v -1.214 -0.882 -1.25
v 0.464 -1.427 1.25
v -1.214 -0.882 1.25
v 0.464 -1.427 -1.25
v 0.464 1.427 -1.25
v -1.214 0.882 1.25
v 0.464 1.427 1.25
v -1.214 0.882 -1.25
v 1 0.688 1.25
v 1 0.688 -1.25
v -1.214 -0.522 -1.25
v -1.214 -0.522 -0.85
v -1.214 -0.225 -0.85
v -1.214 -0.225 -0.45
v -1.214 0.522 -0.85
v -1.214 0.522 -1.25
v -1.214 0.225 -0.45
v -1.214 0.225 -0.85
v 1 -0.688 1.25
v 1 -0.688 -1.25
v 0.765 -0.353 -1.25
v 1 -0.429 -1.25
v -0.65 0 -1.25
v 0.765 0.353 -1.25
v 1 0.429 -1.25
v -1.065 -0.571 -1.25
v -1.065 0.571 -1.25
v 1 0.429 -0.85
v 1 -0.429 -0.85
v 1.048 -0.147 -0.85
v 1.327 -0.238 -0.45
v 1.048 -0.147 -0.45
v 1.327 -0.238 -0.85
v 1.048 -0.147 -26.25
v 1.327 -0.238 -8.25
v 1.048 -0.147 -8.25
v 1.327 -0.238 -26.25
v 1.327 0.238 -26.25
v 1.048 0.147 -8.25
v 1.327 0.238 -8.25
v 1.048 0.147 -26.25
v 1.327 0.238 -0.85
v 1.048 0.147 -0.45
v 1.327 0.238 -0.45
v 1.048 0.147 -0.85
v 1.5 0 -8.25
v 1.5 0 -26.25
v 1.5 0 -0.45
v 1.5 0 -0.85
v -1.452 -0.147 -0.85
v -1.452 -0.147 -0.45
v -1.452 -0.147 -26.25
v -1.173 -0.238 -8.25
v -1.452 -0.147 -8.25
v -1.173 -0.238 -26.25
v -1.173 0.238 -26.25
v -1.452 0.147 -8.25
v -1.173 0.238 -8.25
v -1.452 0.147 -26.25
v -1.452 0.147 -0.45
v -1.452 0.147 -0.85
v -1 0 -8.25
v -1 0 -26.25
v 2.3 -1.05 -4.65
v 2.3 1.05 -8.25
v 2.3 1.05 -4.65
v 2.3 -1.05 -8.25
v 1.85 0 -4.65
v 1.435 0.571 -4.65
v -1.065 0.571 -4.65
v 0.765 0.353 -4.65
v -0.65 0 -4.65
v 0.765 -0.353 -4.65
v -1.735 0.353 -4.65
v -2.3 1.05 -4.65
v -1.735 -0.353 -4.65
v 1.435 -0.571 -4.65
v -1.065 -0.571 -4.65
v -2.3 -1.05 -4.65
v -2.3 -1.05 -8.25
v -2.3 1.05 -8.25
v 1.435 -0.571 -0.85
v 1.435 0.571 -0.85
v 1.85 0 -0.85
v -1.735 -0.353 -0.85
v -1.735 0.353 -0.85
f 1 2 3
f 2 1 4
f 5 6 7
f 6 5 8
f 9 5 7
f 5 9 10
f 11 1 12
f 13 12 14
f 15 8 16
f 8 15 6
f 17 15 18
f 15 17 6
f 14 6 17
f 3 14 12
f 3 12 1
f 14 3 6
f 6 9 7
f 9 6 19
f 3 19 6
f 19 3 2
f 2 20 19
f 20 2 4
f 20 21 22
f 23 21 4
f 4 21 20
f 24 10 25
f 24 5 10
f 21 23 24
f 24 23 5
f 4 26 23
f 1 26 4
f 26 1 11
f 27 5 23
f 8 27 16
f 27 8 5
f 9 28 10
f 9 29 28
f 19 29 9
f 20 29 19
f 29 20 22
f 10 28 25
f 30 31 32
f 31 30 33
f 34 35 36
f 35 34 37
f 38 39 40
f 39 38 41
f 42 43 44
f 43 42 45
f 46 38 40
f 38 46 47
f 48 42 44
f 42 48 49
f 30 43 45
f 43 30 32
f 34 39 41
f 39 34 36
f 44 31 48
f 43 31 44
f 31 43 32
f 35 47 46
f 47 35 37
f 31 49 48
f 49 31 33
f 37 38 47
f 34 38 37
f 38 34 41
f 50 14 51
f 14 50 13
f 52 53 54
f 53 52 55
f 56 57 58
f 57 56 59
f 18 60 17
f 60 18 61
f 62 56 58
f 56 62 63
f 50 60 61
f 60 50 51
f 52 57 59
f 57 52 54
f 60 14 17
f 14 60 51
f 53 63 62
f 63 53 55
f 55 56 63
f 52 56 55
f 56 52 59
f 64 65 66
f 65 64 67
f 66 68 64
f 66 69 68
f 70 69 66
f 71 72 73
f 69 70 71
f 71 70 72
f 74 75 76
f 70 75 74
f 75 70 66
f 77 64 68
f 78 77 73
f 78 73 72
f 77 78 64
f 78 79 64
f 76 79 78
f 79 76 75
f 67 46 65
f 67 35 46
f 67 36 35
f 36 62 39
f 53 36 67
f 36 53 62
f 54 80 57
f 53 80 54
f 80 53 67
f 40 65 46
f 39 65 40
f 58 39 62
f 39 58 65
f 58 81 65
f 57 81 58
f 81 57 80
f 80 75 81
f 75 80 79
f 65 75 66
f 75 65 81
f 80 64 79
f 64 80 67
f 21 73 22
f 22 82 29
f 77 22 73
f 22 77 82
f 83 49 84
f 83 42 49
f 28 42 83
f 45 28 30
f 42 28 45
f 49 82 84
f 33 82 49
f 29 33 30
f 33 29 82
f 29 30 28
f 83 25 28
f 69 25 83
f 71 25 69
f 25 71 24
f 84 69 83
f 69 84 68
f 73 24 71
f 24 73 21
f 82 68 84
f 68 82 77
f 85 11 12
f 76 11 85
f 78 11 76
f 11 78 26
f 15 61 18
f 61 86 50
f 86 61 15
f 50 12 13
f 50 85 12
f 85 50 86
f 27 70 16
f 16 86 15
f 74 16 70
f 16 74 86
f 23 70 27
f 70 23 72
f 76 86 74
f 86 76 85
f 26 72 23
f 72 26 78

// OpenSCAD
// Parameters
body_d = 3.0; //[1.5:6.0:0.1]
body_h = 2.5; //[1.25:5.0:0.1]
lead_d = 0.5; //[0.25:1.0:0.05]
lead_len = 25.0; //[12.5:50.0:0.5]
lead_pitch = 2.5; //[1.25:5.0:0.1]
lead_straight_from_body = 6.0; //[3.0:12.0:0.5]
bend_r = 1.0; //[0.5:2.0:0.1]
overlap = 0.8; //[0.5:2.0:0.1]
lead_exit_depth = 0.8; //[0.4:1.6:0.1]
sleeve_len = 4.0; //[2.0:10.0:0.5]
sleeve_od = 1.2; //[0.8:2.4:0.1]
mold_line_depth = 0.2; //[0.1:0.5:0.05]
mold_line_width = 0.8; //[0.4:1.6:0.1]
lead_spacing_ref_d = 0.8; //[0.4:2.0:0.1]
lead_spacing_ref_h = 1.5; //[0.8:4.0:0.1]

// Thermistor Body
module thermistor_body() {
  color([0.85, 0.85, 0.8]) // Off-white for epoxy/bead
  cylinder(r=body_d/2, h=body_h, center=true);
}

// Lead
module lead(position) {
  translate(position)
  cylinder(r=lead_d/2, h=lead_len + lead_exit_depth, center=true);
}

// Lead Bend Region
module lead_bend_region() {
  color([0.2, 0.2, 0.2]) // Dark color for bend region
  translate([0, 0, -(body_h/2) - lead_straight_from_body + overlap])
  cube([lead_pitch + lead_d + 2*overlap, lead_d + 2*overlap, 2*bend_r + 2*overlap], center=true);
}

// Strain Relief Sleeving
module strain_relief_sleeving(position) {
  translate(position)
  cylinder(r=sleeve_od/2, h=sleeve_len + overlap, center=true);
}

// Lead Spacing Reference
module lead_spacing_reference() {
  color([0.1, 0.1, 0.6]) // Blue for reference
  translate([0, 0, -(body_h/2) - lead_straight_from_body - lead_spacing_ref_h/2 + overlap])
  rotate([0, 90, 0])
  cylinder(r=lead_spacing_ref_d/2, h=lead_spacing_ref_h, center=true);
}

// Body Flat or Mold Line
module body_flat_or_mold_line() {
  translate([body_d/2 - mold_line_depth/2, 0, 0])
  cube([mold_line_width, body_d + 2*overlap, body_h + 2*overlap], center=true);
}

// Polarity or Part Marking
module polarity_or_part_marking() {
  translate([0, body_d/2 - body_d*0.12 - overlap/2, body_h/2 - body_d*0.12 - overlap/2])
  sphere(r=body_d*0.12, center=true);
}

// Assemble Thermistor
module thermistor_complete() {
  difference() {
    thermistor_body();
    body_flat_or_mold_line();
  }
  union() {
    polarity_or_part_marking();
    union() {
      lead([lead_pitch/2, 0, -(body_h/2) - (lead_len + lead_exit_depth)/2 + lead_exit_depth]);
      lead([-lead_pitch/2, 0, -(body_h/2) - (lead_len + lead_exit_depth)/2 + lead_exit_depth]);
      lead_bend_region();
      strain_relief_sleeving([lead_pitch/2, 0, -(body_h/2) - (sleeve_len + overlap)/2 + overlap/2]);
      strain_relief_sleeving([-lead_pitch/2, 0, -(body_h/2) - (sleeve_len + overlap)/2 + overlap/2]);
    }
  }
  lead_spacing_reference();
}

// Final Output
thermistor_complete();
